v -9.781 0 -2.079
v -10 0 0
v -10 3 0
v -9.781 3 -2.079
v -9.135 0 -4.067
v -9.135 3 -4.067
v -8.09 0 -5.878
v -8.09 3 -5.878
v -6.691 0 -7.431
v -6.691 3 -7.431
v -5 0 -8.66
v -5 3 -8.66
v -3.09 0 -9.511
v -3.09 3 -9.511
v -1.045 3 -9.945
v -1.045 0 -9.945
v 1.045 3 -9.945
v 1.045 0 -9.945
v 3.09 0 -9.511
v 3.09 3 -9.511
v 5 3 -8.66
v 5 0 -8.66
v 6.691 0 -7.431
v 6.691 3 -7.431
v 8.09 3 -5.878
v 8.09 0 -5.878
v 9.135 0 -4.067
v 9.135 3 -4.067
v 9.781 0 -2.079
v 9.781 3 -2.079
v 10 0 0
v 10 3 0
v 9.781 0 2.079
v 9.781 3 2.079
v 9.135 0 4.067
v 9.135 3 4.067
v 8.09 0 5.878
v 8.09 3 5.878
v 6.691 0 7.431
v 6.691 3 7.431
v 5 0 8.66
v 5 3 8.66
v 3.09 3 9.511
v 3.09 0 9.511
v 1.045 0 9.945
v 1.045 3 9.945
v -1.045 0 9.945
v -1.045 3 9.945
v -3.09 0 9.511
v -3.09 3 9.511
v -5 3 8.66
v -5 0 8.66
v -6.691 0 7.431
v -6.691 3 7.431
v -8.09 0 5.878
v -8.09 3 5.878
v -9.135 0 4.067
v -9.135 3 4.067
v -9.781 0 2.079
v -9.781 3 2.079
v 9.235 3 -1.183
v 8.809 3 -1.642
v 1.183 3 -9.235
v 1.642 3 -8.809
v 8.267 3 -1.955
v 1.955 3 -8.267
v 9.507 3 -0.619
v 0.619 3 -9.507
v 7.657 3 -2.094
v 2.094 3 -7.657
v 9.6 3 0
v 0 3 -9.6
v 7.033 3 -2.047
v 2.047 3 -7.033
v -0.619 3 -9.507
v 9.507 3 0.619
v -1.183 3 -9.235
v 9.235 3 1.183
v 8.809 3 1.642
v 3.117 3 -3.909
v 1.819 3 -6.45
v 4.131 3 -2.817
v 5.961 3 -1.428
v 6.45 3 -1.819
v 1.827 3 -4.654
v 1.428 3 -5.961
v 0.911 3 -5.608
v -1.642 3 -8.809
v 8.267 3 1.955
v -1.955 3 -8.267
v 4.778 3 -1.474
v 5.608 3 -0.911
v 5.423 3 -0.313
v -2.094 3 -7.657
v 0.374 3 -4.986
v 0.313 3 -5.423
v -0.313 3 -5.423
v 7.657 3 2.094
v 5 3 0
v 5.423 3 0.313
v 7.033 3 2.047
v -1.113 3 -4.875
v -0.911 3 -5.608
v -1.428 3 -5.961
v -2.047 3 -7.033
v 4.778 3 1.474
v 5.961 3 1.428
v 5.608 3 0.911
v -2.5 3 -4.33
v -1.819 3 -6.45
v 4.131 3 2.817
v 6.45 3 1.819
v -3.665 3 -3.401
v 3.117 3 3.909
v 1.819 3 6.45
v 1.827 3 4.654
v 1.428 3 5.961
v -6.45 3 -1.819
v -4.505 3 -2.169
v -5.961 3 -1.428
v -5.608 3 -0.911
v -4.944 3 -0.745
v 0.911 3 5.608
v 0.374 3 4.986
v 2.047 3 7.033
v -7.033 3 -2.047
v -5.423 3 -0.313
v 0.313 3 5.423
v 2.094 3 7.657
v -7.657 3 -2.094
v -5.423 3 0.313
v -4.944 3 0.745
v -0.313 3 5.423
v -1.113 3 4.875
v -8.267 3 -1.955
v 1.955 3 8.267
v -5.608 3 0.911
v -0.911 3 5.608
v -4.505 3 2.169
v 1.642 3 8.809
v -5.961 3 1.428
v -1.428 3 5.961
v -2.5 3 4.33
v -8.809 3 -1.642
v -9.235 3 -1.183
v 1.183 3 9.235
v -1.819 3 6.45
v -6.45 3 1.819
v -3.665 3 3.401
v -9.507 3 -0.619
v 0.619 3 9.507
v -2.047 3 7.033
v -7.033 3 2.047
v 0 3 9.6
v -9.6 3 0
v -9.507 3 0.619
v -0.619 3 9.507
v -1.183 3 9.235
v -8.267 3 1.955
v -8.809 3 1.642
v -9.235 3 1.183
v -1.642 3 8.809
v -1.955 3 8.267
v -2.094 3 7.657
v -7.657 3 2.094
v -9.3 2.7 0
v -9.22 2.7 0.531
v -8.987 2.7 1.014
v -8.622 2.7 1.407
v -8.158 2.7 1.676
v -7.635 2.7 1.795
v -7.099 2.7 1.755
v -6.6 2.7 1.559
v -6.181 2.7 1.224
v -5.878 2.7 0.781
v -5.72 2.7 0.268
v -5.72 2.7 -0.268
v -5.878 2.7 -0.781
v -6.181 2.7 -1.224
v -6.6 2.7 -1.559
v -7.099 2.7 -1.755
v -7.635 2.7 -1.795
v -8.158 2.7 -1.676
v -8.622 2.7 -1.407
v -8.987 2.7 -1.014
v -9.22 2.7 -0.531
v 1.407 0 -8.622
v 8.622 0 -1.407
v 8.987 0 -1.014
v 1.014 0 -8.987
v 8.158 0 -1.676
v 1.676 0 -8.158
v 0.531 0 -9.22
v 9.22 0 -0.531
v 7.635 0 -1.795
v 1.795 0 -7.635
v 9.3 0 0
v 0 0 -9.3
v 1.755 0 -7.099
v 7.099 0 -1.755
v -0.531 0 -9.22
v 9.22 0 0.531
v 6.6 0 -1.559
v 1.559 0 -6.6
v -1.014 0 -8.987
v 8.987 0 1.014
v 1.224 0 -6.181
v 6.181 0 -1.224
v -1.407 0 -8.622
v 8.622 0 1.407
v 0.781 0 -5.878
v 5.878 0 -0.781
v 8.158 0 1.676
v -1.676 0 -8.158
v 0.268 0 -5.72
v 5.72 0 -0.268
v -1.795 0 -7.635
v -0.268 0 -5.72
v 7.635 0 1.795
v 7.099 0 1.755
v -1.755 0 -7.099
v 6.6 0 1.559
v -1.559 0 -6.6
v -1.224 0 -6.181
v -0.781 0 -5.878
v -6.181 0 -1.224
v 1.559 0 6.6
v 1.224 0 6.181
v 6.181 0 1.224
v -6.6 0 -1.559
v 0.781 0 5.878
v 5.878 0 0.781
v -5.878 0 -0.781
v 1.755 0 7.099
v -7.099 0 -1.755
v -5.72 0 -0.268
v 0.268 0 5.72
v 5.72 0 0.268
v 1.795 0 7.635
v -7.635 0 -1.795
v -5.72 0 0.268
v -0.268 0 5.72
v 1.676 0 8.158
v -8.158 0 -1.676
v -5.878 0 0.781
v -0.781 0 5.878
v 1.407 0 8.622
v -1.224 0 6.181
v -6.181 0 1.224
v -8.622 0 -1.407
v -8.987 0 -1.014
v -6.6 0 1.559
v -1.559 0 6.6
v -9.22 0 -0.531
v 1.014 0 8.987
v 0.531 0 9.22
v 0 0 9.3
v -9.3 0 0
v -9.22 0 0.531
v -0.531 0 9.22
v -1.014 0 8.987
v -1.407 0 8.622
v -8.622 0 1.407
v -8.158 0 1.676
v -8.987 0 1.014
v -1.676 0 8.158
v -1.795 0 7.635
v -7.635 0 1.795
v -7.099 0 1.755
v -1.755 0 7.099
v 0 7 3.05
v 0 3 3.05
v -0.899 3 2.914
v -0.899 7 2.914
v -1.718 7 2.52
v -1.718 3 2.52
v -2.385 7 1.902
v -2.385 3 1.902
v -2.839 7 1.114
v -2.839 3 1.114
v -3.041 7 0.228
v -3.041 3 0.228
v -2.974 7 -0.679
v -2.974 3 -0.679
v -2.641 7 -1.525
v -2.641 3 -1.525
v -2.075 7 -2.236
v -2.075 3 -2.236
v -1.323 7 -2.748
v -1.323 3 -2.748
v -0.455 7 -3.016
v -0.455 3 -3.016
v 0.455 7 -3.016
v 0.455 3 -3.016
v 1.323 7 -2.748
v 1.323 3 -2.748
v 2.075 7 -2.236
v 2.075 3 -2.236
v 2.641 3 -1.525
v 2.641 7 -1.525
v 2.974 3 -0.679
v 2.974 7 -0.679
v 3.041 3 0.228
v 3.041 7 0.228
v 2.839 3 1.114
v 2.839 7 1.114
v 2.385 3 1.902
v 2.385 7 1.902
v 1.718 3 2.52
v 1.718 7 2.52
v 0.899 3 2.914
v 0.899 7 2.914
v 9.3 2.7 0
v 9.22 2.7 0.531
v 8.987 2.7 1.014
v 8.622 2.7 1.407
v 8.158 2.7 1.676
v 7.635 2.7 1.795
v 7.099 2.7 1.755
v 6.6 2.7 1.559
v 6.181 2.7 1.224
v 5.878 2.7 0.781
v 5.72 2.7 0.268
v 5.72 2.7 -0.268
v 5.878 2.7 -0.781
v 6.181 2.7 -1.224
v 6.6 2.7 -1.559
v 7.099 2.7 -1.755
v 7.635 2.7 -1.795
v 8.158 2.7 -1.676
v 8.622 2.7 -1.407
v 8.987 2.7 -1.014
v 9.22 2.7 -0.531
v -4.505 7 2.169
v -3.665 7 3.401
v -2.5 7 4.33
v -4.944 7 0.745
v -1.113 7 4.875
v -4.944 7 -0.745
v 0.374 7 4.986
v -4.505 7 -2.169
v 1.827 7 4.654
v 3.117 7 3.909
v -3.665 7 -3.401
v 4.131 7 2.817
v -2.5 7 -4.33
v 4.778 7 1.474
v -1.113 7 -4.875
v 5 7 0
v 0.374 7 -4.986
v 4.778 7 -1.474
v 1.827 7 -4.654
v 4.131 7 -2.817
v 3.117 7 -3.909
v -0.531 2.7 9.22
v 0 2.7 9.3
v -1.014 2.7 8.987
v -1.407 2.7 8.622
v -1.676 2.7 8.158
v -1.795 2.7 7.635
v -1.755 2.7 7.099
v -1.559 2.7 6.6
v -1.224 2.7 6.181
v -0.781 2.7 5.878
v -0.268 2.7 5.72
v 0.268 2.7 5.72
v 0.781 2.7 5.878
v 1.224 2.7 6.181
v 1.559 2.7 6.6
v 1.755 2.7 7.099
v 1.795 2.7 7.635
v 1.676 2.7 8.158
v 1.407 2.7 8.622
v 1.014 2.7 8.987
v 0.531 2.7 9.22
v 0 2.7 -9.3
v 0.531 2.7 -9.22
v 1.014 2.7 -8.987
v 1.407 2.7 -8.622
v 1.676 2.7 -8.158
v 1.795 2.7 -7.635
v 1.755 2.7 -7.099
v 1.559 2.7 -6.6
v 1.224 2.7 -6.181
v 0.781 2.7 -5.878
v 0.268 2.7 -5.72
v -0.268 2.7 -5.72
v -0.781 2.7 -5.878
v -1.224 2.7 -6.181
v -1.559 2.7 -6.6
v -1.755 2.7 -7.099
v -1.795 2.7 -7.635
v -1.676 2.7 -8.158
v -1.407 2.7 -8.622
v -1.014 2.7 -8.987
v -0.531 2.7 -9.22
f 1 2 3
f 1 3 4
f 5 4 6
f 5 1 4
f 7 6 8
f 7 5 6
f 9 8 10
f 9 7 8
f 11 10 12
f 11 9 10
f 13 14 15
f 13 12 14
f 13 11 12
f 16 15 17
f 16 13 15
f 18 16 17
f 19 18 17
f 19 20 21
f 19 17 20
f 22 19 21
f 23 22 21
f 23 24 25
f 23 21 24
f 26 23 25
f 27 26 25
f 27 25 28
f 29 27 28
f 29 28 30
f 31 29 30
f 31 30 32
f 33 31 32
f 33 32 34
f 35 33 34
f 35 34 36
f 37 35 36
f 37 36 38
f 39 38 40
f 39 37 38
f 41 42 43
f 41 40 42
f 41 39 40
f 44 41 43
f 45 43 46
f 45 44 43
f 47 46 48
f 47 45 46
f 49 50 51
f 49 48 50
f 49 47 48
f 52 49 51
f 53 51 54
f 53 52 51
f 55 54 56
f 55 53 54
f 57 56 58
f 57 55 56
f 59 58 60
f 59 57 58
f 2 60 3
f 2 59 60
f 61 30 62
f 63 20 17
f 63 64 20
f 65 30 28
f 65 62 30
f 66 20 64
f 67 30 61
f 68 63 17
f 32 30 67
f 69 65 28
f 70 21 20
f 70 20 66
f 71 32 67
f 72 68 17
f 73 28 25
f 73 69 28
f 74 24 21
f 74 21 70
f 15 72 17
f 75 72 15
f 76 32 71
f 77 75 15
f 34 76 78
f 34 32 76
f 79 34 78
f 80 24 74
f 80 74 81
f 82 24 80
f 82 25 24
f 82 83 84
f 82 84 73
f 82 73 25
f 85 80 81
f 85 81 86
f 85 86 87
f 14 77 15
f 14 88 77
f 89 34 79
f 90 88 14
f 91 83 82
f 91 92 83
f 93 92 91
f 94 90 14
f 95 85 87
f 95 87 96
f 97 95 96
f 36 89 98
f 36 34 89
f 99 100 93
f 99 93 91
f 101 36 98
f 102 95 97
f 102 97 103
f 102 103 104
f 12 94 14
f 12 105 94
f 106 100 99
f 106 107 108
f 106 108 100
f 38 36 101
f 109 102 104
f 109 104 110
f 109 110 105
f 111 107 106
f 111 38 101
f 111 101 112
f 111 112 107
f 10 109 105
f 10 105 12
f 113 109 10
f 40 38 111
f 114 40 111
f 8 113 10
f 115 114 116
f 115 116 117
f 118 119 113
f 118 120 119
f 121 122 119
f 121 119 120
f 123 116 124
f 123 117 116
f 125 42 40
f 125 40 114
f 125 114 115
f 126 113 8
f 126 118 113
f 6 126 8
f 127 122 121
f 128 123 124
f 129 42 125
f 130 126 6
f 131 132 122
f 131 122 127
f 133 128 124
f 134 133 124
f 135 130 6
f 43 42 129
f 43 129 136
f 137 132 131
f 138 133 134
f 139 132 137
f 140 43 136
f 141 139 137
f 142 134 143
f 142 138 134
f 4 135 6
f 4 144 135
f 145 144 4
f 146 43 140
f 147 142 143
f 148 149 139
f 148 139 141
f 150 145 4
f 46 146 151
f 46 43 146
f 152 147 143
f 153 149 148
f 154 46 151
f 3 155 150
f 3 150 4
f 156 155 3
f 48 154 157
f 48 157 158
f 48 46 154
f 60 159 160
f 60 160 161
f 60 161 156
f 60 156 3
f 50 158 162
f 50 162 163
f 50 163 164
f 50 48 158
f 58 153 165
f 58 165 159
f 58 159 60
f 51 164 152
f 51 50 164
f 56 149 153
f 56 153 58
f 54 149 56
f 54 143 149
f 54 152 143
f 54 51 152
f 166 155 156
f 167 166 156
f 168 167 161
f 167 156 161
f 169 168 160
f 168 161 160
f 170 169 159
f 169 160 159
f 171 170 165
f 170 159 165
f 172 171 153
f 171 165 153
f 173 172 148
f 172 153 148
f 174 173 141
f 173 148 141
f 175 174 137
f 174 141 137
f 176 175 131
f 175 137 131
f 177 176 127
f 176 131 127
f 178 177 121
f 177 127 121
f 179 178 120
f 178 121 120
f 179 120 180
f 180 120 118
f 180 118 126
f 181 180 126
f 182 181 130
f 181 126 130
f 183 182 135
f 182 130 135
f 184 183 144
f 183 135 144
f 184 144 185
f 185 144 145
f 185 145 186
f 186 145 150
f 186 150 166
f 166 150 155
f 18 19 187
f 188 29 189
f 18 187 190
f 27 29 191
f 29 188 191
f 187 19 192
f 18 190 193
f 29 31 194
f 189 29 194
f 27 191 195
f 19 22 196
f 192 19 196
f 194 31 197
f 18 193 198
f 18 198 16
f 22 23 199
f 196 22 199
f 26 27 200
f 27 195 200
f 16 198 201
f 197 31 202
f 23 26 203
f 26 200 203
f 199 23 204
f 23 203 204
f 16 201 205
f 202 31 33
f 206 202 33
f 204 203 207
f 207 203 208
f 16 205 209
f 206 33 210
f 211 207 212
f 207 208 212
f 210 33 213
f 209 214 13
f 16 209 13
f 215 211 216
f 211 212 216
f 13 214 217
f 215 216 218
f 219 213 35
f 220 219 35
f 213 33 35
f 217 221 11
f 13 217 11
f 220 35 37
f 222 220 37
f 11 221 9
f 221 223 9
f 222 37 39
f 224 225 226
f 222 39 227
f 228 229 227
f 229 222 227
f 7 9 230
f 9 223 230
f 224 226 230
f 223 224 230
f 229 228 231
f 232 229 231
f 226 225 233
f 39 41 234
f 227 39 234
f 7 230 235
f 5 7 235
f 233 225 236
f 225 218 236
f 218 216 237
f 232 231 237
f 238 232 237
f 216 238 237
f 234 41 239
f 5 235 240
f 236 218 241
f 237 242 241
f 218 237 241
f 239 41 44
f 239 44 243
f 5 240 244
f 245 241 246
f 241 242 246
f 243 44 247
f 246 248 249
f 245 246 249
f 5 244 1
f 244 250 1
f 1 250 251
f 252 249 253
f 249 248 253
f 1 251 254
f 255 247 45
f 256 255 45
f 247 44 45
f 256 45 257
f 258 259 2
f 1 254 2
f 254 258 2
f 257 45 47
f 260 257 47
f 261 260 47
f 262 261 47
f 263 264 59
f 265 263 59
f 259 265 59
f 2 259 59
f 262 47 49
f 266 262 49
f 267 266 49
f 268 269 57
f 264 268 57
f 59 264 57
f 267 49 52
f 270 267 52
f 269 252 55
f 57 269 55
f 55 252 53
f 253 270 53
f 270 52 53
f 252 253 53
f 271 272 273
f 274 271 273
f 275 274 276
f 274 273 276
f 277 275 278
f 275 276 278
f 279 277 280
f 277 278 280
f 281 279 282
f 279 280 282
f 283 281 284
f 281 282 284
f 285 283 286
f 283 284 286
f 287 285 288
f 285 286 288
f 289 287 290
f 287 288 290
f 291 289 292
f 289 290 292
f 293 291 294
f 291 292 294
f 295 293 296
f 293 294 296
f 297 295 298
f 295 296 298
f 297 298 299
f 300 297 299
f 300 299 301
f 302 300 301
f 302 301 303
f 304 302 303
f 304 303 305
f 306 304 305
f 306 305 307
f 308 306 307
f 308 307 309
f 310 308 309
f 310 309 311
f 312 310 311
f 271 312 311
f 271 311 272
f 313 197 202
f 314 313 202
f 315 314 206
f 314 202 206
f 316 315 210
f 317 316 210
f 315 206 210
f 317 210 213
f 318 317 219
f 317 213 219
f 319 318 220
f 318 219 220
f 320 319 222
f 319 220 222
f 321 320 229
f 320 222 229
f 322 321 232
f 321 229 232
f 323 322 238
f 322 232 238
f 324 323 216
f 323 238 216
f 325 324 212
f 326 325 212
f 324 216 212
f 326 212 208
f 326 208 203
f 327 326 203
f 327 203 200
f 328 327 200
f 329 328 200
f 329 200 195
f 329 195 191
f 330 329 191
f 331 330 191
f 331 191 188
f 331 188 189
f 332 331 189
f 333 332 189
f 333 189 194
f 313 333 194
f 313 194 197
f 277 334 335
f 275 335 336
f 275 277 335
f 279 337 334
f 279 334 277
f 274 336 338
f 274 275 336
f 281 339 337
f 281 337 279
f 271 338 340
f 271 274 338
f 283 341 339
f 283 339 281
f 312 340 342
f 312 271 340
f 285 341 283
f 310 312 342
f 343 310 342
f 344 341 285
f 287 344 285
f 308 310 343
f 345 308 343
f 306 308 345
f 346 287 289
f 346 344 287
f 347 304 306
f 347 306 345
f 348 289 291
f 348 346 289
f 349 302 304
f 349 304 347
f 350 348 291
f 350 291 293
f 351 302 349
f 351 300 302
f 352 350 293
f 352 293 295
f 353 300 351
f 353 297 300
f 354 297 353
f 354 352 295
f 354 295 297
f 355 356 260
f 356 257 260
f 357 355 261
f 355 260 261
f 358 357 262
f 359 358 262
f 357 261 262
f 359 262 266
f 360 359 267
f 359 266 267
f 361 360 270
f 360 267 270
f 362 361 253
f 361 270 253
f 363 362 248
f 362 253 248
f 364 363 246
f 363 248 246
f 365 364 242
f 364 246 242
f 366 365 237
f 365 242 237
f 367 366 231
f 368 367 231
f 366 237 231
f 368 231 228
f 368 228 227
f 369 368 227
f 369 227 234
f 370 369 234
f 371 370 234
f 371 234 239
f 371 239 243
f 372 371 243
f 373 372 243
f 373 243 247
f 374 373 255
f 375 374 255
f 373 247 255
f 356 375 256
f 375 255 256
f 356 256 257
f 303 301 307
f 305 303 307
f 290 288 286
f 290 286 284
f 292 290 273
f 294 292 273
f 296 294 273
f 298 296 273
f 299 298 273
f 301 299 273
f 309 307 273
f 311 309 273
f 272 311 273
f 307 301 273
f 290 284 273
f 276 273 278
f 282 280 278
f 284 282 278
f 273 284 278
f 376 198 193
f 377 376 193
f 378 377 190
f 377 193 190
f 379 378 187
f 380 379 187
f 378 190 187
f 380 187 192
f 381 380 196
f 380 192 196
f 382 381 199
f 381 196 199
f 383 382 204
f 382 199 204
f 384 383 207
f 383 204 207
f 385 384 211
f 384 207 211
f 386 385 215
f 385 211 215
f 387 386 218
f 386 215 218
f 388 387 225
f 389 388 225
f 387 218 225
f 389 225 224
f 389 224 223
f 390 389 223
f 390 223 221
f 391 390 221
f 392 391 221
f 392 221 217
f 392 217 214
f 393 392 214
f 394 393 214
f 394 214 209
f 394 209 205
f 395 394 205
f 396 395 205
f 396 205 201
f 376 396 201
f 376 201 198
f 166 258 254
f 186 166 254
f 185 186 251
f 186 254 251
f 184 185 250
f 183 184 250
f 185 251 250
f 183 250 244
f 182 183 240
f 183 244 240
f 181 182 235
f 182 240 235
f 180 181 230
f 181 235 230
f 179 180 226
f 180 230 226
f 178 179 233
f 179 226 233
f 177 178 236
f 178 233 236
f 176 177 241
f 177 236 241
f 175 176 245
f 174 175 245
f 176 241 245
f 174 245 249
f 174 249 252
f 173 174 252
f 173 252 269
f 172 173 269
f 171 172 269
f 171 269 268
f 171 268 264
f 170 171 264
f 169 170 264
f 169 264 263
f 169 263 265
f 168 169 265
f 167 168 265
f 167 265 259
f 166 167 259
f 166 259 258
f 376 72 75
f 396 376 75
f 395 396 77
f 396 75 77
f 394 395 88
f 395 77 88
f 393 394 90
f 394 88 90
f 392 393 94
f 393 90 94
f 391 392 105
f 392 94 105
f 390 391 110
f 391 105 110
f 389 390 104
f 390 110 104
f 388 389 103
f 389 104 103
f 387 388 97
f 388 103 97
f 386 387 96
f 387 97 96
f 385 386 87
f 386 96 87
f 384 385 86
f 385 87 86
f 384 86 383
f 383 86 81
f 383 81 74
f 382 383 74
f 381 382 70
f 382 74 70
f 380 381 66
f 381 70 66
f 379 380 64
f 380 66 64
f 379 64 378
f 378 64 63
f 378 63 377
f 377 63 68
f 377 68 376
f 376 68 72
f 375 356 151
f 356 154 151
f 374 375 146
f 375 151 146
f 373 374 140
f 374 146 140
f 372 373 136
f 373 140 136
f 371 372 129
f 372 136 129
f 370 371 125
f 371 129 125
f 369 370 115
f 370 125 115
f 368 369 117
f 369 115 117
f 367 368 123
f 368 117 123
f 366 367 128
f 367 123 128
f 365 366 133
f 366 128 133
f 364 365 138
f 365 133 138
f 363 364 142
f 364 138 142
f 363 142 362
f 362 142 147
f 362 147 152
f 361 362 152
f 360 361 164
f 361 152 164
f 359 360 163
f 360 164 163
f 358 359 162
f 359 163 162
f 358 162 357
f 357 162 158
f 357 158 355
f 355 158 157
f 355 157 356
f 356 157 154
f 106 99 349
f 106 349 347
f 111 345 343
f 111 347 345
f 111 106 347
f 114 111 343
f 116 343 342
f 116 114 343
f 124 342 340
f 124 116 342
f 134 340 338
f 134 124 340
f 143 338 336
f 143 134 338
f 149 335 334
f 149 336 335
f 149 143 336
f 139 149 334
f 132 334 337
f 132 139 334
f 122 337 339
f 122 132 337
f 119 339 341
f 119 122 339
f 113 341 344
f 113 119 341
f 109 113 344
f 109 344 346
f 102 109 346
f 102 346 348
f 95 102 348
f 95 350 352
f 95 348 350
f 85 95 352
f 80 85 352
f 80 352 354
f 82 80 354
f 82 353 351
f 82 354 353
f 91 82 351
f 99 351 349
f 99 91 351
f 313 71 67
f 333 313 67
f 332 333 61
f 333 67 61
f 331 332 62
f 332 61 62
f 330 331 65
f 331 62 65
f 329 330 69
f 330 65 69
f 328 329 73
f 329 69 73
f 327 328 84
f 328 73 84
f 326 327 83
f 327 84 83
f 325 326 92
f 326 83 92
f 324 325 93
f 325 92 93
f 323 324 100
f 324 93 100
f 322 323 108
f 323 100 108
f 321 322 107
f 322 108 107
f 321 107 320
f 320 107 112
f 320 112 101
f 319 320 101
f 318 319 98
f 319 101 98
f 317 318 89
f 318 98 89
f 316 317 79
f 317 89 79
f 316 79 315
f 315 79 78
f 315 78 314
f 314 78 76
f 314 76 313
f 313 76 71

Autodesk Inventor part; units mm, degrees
ref_plane "YZ Plane" through (0, 0, 0) normal (1, 0, 0) x (0, 1, 0)
ref_plane "XZ Plane" through (0, 0, 0) normal (0, 1, 0) x (-1, 0, 0)
ref_plane "XY Plane" through (0, 0, 0) normal (0, 0, 1) x (1, 0, 0)
sketch "Эскиз1" plane through (0, 0, 0) normal (0, 1, 0) x (-1, 0, 0)
  circle A0 centre (0, 0) radius 10
  dimension "d0" = 20
extrude "Выдавливание1" add sketch "Эскиз1" along normal blind 3
sketch "Эскиз2" plane through (0, 3, 0) normal (0, 1, 0) x (1, 0, 0)
  circle A0 centre (0, 0) radius 10 projected
  circle A1 centre (0, 0) radius 5
  dimension "d3" = 10
extrude "Выдавливание2" add sketch "Эскиз2" along normal blind 4 contours A1
sketch "Эскиз3" plane through (0, 7, 0) normal (0, 1, 0) x (1, 0, 0)
  circle A0 centre (0, 0) radius 5 projected
hole "Отверстие1" at (0, 7, 0) direction (0, -1, 0) diameter 6.1 depth 4
sketch "Эскиз4" plane through (0, 3, 0) normal (0, 1, 0) x (1, 0, 0)
  circle A0 centre (0, 0) radius 5 projected
  circle A1 centre (0, 0) radius 10 projected
  circle A2 centre (0, 0) radius 7.5 construction
  point P0 (0, -7.5)
  dimension "d22" = 15
  dimension "d13" = 5
hole "Отверстие2" at (0, 3, 7.5) direction (0, -1, 0) diameter 3.6 depth 4 countersink diameter 4.2 countersink angle 90
pattern_circular "Круговой массив1" count 4 over 360 about axis through (0, 5, 0) along (0, 1, 0) of "Отверстие2"
properties part number "втулка"
